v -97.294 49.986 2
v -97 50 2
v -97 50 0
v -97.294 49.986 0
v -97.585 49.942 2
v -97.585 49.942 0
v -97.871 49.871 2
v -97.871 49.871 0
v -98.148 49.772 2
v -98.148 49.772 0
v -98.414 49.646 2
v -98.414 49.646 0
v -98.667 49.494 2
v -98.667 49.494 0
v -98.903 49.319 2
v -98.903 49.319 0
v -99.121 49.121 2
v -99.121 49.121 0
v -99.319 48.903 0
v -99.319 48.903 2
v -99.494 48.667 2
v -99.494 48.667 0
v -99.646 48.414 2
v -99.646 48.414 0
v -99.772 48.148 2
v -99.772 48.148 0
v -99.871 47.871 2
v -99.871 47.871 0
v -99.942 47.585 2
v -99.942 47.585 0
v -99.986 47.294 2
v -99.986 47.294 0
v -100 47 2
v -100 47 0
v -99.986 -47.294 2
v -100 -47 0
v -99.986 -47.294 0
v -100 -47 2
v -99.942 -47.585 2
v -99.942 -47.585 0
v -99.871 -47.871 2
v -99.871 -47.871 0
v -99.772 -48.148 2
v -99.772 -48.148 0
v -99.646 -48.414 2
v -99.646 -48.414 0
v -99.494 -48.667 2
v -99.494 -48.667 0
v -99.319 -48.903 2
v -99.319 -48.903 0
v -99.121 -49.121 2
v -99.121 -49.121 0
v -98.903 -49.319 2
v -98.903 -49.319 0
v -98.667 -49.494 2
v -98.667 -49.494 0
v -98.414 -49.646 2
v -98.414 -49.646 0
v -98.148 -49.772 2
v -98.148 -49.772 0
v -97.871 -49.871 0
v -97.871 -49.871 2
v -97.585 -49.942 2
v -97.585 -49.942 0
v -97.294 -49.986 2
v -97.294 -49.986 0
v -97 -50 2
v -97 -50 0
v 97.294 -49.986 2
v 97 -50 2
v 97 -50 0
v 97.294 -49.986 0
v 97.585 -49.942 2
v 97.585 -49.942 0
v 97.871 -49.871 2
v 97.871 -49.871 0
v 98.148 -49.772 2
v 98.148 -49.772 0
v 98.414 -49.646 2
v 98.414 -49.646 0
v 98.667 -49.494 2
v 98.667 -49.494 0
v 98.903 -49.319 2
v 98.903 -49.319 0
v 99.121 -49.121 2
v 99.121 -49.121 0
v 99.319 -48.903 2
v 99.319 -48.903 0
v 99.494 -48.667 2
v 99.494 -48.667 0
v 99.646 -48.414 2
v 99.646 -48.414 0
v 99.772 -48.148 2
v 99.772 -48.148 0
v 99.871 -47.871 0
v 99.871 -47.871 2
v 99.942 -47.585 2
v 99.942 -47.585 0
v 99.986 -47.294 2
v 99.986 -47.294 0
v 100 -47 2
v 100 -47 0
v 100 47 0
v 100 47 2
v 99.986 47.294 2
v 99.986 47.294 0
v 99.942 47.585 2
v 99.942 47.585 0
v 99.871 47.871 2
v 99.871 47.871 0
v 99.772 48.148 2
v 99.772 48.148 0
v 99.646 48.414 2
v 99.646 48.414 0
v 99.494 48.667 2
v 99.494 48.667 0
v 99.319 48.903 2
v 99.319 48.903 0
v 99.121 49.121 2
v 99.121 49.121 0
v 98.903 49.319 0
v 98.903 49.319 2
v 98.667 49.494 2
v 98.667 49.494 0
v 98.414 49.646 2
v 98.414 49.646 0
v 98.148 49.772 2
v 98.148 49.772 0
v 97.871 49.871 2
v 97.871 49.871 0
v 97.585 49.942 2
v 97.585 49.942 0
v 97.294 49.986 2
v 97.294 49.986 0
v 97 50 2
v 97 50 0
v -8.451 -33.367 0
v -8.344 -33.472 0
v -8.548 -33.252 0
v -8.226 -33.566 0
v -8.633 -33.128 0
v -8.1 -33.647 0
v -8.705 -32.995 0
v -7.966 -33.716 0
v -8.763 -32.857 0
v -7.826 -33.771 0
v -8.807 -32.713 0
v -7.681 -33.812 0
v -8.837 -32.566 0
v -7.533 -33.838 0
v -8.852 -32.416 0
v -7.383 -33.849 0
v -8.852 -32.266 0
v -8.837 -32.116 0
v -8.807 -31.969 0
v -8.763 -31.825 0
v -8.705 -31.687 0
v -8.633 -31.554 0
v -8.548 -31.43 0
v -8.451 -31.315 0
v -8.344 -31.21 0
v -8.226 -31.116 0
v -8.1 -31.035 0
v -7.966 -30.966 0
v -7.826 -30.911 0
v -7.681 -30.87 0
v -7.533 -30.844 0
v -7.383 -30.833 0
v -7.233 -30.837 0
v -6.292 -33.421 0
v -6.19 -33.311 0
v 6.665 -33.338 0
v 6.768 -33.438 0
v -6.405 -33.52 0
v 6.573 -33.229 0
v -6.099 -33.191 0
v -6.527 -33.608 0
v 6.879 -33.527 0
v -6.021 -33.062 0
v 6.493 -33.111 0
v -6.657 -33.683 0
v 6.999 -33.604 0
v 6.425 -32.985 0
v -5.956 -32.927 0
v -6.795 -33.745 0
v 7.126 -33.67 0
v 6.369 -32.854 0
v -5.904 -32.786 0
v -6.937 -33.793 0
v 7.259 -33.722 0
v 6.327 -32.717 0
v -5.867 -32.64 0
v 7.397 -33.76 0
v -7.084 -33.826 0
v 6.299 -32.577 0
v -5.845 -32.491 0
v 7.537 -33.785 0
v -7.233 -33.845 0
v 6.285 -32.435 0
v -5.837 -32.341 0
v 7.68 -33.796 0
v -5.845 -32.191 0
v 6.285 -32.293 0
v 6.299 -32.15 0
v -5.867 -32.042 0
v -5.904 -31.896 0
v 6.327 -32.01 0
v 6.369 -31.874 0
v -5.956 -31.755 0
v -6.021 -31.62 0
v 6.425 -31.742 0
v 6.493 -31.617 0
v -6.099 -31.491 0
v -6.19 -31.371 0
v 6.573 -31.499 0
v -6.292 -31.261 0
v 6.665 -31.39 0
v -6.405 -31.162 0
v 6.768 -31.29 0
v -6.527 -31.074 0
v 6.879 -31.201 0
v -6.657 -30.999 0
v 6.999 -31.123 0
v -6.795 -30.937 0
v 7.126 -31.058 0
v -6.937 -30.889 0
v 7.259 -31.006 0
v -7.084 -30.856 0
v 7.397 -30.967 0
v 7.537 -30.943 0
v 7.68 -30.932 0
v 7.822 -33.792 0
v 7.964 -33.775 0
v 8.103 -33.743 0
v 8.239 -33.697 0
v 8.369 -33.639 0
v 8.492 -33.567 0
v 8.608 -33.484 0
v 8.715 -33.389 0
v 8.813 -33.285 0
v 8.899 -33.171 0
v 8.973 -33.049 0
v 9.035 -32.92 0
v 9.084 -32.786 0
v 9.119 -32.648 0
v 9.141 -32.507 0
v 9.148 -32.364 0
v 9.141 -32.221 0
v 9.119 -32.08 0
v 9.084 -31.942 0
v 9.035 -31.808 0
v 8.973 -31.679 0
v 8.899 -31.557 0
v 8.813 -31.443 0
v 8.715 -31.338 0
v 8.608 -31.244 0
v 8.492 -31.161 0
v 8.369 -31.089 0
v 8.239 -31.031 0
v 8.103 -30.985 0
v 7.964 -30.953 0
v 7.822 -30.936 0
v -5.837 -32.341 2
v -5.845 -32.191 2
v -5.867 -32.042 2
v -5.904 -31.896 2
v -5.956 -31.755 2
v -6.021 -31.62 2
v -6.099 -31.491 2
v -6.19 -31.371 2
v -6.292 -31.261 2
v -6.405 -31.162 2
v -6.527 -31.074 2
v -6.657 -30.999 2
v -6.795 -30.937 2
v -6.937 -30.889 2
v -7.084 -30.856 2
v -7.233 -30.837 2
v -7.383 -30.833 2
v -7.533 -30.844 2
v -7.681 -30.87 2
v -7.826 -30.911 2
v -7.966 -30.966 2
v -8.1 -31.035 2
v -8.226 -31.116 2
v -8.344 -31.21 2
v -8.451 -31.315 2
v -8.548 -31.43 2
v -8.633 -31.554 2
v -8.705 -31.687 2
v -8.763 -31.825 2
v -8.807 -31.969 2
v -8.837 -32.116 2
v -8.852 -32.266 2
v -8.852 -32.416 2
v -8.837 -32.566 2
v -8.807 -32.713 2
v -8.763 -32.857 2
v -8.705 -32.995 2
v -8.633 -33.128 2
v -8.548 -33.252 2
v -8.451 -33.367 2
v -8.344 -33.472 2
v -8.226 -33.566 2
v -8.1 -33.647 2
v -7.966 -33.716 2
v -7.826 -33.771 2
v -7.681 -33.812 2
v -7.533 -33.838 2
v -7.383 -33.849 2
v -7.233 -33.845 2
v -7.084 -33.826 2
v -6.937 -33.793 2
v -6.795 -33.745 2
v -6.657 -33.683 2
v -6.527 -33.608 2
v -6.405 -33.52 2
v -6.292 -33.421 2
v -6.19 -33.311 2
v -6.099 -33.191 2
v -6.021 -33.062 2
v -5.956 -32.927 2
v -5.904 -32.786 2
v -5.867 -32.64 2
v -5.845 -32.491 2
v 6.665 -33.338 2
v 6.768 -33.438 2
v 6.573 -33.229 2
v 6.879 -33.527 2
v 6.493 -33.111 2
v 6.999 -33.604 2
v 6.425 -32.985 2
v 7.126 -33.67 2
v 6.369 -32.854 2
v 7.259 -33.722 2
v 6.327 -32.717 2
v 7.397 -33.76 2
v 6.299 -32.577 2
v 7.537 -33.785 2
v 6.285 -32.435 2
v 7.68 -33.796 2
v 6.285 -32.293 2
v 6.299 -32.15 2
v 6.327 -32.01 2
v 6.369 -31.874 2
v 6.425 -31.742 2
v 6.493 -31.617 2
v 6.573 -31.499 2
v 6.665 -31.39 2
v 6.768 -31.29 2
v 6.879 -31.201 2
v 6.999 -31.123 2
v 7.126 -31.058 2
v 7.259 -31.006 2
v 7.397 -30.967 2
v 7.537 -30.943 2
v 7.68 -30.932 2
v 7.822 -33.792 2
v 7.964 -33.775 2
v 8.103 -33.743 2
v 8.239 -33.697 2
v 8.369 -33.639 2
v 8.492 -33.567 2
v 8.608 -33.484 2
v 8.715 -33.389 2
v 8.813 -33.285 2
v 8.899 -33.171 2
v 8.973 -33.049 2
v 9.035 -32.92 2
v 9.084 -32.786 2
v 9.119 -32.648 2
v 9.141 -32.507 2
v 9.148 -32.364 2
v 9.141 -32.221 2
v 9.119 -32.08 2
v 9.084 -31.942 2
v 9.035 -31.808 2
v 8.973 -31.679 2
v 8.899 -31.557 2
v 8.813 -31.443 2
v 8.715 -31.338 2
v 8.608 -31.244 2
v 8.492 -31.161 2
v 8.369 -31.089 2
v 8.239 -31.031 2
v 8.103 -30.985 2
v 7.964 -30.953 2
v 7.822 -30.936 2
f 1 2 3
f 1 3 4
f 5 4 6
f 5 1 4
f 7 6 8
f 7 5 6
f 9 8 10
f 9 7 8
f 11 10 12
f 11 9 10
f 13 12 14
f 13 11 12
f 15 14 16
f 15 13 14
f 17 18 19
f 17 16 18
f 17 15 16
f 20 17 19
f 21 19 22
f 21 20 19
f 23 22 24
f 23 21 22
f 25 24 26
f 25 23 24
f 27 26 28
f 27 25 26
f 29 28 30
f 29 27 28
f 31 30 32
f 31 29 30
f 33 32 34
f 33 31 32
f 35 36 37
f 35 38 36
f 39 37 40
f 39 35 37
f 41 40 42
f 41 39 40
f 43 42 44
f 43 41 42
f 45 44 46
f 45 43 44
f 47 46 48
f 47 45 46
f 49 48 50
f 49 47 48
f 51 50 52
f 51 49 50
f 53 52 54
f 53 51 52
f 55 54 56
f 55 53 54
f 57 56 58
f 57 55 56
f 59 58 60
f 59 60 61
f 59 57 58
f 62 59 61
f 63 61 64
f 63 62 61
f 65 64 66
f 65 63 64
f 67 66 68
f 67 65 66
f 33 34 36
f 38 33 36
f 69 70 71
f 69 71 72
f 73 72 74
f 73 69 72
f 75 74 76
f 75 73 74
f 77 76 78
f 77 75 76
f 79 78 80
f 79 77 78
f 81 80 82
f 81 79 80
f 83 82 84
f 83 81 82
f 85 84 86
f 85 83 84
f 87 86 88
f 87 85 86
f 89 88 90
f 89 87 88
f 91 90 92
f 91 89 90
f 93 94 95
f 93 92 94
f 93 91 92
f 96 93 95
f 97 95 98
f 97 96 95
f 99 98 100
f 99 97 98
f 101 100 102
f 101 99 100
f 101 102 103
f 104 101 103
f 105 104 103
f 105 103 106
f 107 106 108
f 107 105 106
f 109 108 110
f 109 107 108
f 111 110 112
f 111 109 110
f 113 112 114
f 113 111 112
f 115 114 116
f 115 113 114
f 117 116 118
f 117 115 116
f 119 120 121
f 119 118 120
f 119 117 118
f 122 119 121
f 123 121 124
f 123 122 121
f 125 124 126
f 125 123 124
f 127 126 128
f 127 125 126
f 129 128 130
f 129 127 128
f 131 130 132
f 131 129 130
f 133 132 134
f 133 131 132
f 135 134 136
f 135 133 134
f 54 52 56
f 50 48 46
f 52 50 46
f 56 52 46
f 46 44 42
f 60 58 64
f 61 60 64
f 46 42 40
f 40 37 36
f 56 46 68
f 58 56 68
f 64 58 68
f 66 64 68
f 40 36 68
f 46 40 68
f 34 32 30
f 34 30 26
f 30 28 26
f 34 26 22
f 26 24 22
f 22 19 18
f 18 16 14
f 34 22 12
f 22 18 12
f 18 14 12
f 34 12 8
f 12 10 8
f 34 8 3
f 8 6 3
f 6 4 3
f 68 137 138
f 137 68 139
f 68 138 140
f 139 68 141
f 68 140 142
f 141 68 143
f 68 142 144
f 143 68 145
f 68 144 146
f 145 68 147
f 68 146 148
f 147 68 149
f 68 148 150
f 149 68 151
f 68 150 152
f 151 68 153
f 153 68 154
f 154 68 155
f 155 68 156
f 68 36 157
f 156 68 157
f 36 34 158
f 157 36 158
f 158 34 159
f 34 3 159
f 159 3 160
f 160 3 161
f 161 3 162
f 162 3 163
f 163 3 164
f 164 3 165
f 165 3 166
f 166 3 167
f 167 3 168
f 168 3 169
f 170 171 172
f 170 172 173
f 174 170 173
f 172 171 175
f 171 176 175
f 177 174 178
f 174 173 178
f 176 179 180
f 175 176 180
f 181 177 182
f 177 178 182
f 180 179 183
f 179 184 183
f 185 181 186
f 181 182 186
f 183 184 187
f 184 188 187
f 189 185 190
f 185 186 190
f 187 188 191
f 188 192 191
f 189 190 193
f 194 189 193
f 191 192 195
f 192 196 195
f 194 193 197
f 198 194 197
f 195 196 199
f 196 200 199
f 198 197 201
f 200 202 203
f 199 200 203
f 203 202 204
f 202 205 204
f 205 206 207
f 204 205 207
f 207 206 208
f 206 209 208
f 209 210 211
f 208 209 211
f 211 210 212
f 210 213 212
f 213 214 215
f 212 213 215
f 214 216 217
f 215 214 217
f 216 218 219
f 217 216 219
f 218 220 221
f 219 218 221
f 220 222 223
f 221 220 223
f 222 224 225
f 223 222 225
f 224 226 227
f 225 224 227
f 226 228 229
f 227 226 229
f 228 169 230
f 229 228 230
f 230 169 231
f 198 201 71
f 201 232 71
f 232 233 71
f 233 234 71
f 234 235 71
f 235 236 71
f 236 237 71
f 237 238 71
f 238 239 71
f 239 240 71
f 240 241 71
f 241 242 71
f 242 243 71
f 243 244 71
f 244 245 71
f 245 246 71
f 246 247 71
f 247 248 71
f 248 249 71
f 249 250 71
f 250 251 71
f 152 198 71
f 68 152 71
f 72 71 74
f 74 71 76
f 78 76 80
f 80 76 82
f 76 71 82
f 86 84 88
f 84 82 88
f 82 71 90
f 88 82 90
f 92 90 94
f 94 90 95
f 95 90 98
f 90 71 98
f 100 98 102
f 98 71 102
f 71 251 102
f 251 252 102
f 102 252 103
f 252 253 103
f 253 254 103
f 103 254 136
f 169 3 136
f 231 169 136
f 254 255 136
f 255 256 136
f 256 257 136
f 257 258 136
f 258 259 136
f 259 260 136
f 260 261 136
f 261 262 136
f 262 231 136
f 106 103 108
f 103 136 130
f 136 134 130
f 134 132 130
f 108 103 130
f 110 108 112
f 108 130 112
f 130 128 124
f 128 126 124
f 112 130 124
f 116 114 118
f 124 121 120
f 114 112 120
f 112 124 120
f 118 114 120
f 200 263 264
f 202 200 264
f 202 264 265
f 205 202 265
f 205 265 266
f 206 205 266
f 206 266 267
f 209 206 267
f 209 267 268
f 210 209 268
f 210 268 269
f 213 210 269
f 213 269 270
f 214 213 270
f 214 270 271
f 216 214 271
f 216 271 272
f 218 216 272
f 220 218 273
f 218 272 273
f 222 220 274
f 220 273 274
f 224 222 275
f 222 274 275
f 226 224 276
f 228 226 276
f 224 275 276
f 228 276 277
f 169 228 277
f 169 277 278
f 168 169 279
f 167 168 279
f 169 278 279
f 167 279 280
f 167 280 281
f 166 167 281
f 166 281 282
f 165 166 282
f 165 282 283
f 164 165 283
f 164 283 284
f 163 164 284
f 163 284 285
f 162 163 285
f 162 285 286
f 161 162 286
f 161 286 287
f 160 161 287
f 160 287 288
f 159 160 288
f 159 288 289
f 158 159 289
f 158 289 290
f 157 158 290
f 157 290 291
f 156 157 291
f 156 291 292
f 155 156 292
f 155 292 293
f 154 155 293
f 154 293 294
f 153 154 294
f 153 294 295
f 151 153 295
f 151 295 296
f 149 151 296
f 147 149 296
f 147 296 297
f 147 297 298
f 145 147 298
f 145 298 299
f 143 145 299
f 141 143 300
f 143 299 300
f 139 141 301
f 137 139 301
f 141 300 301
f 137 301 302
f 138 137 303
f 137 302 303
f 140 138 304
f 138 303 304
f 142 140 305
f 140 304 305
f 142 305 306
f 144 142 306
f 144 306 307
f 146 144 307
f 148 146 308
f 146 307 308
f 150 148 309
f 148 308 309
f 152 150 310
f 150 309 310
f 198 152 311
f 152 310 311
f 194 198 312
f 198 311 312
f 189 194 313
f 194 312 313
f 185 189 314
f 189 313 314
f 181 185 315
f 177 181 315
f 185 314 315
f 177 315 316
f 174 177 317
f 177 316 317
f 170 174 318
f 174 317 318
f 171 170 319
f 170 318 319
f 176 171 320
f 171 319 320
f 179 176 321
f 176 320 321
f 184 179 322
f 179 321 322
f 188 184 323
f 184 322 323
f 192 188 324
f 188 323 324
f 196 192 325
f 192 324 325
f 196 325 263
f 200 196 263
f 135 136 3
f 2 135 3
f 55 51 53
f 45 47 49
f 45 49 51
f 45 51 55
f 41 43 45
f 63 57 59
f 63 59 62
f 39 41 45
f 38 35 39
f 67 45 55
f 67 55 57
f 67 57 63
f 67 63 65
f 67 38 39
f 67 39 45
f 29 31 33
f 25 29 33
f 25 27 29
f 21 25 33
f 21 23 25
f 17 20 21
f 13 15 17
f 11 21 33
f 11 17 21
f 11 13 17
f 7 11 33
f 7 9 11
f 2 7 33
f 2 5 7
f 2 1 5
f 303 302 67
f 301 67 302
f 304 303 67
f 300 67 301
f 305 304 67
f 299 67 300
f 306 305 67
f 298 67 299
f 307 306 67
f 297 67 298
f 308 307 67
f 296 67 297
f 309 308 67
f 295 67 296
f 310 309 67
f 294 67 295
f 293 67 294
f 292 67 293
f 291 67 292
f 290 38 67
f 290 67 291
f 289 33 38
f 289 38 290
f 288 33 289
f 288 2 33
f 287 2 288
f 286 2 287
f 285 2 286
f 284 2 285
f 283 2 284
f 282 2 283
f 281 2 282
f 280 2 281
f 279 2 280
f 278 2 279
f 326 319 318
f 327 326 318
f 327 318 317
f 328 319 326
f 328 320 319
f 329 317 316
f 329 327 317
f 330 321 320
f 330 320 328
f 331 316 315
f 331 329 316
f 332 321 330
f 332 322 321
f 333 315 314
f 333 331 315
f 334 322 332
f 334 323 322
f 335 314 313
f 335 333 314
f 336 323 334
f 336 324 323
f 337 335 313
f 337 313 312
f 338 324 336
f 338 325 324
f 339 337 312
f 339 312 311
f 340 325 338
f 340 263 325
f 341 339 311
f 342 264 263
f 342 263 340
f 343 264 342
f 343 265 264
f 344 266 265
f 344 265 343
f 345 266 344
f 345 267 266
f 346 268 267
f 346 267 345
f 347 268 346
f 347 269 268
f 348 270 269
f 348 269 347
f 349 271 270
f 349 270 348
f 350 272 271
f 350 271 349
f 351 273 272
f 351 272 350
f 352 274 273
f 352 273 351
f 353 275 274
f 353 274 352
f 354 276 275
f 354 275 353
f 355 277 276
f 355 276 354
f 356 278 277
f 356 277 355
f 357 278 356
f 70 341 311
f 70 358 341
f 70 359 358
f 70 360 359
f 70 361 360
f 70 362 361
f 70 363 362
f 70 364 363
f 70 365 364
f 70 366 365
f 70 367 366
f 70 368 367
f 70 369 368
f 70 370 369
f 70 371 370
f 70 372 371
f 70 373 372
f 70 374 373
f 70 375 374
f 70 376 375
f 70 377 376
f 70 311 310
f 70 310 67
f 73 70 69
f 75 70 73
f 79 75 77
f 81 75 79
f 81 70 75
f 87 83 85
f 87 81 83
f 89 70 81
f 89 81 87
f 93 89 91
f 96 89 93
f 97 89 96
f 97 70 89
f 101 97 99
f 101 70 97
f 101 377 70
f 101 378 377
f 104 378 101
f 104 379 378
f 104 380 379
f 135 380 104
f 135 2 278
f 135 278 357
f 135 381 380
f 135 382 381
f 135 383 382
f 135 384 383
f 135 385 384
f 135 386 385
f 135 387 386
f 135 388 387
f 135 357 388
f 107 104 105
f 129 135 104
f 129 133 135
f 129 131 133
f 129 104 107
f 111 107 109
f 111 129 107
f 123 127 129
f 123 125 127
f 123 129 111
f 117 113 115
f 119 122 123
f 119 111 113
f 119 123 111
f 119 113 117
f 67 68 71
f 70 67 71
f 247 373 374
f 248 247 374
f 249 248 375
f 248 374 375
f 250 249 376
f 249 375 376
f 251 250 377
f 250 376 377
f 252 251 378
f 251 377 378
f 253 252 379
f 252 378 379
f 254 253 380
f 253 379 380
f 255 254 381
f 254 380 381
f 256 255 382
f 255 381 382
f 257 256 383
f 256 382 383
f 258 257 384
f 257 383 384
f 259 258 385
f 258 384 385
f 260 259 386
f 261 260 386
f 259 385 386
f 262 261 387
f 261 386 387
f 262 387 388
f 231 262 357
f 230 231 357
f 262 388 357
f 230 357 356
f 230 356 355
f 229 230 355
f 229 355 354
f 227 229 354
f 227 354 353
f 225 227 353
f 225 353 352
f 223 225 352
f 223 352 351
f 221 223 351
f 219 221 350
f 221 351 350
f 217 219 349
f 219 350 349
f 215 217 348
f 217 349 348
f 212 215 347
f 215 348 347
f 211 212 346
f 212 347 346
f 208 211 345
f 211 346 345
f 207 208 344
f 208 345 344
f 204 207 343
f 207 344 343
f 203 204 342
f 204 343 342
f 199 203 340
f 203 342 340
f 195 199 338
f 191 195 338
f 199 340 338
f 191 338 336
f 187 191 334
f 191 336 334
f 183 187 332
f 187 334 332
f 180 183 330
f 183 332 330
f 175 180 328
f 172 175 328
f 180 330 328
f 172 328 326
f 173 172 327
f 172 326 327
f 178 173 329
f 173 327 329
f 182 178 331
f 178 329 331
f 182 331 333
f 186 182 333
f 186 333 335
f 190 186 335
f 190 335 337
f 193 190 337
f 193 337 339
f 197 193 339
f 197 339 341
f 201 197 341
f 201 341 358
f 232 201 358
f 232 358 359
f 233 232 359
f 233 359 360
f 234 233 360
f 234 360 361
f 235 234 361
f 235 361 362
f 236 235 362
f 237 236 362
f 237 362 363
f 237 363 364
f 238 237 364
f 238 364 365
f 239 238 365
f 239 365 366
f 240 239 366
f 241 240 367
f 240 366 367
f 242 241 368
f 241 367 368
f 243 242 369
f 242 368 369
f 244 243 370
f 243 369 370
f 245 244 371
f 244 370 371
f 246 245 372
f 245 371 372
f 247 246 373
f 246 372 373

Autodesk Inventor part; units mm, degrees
ref_plane "YZ Plane" through (0, 0, 0) normal (1, 0, 0) x (0, 1, 0)
ref_plane "XZ Plane" through (0, 0, 0) normal (0, 1, 0) x (-1, 0, 0)
ref_plane "XY Plane" through (0, 0, 0) normal (0, 0, 1) x (1, 0, 0)
sketch "Sketch1" plane through (0, 0, 0) normal (0, 0, 1) x (1, 0, 0)
  line L0 (-100, -50) -> (100, -50)
  line L1 (100, -50) -> (100, 50)
  line L2 (100, 50) -> (-100, 50)
  line L3 (-100, 50) -> (-100, -50)
  line L4 (-100, -50) -> (100, 50) construction
  line L5 (100, -50) -> (-100, 50) construction
  point P0 (0, 0)
  dimension "d0" = 200
  dimension "d1" = 100
extrude "Extrusion1" add sketch "Sketch1" along normal blind 2
fillet "Fillet1" radius 3 4 edges at (-100, 50, 1) (100, 50, 1) (100, -50, 1) (-100, -50, 1)
sketch "Sketch2" plane through (0, 0, 2) normal (0, 0, 1) x (1, 0, 0)
  circle A0 centre (-7.3456, -32.341) radius 1.5084 projected
  circle A1 centre (7.7153, -32.3639) radius 1.4324 projected
  point P0 (0, 0)
extrude "Extrusion2" cut sketch "Sketch2" against normal through all
properties part number "PCB"
